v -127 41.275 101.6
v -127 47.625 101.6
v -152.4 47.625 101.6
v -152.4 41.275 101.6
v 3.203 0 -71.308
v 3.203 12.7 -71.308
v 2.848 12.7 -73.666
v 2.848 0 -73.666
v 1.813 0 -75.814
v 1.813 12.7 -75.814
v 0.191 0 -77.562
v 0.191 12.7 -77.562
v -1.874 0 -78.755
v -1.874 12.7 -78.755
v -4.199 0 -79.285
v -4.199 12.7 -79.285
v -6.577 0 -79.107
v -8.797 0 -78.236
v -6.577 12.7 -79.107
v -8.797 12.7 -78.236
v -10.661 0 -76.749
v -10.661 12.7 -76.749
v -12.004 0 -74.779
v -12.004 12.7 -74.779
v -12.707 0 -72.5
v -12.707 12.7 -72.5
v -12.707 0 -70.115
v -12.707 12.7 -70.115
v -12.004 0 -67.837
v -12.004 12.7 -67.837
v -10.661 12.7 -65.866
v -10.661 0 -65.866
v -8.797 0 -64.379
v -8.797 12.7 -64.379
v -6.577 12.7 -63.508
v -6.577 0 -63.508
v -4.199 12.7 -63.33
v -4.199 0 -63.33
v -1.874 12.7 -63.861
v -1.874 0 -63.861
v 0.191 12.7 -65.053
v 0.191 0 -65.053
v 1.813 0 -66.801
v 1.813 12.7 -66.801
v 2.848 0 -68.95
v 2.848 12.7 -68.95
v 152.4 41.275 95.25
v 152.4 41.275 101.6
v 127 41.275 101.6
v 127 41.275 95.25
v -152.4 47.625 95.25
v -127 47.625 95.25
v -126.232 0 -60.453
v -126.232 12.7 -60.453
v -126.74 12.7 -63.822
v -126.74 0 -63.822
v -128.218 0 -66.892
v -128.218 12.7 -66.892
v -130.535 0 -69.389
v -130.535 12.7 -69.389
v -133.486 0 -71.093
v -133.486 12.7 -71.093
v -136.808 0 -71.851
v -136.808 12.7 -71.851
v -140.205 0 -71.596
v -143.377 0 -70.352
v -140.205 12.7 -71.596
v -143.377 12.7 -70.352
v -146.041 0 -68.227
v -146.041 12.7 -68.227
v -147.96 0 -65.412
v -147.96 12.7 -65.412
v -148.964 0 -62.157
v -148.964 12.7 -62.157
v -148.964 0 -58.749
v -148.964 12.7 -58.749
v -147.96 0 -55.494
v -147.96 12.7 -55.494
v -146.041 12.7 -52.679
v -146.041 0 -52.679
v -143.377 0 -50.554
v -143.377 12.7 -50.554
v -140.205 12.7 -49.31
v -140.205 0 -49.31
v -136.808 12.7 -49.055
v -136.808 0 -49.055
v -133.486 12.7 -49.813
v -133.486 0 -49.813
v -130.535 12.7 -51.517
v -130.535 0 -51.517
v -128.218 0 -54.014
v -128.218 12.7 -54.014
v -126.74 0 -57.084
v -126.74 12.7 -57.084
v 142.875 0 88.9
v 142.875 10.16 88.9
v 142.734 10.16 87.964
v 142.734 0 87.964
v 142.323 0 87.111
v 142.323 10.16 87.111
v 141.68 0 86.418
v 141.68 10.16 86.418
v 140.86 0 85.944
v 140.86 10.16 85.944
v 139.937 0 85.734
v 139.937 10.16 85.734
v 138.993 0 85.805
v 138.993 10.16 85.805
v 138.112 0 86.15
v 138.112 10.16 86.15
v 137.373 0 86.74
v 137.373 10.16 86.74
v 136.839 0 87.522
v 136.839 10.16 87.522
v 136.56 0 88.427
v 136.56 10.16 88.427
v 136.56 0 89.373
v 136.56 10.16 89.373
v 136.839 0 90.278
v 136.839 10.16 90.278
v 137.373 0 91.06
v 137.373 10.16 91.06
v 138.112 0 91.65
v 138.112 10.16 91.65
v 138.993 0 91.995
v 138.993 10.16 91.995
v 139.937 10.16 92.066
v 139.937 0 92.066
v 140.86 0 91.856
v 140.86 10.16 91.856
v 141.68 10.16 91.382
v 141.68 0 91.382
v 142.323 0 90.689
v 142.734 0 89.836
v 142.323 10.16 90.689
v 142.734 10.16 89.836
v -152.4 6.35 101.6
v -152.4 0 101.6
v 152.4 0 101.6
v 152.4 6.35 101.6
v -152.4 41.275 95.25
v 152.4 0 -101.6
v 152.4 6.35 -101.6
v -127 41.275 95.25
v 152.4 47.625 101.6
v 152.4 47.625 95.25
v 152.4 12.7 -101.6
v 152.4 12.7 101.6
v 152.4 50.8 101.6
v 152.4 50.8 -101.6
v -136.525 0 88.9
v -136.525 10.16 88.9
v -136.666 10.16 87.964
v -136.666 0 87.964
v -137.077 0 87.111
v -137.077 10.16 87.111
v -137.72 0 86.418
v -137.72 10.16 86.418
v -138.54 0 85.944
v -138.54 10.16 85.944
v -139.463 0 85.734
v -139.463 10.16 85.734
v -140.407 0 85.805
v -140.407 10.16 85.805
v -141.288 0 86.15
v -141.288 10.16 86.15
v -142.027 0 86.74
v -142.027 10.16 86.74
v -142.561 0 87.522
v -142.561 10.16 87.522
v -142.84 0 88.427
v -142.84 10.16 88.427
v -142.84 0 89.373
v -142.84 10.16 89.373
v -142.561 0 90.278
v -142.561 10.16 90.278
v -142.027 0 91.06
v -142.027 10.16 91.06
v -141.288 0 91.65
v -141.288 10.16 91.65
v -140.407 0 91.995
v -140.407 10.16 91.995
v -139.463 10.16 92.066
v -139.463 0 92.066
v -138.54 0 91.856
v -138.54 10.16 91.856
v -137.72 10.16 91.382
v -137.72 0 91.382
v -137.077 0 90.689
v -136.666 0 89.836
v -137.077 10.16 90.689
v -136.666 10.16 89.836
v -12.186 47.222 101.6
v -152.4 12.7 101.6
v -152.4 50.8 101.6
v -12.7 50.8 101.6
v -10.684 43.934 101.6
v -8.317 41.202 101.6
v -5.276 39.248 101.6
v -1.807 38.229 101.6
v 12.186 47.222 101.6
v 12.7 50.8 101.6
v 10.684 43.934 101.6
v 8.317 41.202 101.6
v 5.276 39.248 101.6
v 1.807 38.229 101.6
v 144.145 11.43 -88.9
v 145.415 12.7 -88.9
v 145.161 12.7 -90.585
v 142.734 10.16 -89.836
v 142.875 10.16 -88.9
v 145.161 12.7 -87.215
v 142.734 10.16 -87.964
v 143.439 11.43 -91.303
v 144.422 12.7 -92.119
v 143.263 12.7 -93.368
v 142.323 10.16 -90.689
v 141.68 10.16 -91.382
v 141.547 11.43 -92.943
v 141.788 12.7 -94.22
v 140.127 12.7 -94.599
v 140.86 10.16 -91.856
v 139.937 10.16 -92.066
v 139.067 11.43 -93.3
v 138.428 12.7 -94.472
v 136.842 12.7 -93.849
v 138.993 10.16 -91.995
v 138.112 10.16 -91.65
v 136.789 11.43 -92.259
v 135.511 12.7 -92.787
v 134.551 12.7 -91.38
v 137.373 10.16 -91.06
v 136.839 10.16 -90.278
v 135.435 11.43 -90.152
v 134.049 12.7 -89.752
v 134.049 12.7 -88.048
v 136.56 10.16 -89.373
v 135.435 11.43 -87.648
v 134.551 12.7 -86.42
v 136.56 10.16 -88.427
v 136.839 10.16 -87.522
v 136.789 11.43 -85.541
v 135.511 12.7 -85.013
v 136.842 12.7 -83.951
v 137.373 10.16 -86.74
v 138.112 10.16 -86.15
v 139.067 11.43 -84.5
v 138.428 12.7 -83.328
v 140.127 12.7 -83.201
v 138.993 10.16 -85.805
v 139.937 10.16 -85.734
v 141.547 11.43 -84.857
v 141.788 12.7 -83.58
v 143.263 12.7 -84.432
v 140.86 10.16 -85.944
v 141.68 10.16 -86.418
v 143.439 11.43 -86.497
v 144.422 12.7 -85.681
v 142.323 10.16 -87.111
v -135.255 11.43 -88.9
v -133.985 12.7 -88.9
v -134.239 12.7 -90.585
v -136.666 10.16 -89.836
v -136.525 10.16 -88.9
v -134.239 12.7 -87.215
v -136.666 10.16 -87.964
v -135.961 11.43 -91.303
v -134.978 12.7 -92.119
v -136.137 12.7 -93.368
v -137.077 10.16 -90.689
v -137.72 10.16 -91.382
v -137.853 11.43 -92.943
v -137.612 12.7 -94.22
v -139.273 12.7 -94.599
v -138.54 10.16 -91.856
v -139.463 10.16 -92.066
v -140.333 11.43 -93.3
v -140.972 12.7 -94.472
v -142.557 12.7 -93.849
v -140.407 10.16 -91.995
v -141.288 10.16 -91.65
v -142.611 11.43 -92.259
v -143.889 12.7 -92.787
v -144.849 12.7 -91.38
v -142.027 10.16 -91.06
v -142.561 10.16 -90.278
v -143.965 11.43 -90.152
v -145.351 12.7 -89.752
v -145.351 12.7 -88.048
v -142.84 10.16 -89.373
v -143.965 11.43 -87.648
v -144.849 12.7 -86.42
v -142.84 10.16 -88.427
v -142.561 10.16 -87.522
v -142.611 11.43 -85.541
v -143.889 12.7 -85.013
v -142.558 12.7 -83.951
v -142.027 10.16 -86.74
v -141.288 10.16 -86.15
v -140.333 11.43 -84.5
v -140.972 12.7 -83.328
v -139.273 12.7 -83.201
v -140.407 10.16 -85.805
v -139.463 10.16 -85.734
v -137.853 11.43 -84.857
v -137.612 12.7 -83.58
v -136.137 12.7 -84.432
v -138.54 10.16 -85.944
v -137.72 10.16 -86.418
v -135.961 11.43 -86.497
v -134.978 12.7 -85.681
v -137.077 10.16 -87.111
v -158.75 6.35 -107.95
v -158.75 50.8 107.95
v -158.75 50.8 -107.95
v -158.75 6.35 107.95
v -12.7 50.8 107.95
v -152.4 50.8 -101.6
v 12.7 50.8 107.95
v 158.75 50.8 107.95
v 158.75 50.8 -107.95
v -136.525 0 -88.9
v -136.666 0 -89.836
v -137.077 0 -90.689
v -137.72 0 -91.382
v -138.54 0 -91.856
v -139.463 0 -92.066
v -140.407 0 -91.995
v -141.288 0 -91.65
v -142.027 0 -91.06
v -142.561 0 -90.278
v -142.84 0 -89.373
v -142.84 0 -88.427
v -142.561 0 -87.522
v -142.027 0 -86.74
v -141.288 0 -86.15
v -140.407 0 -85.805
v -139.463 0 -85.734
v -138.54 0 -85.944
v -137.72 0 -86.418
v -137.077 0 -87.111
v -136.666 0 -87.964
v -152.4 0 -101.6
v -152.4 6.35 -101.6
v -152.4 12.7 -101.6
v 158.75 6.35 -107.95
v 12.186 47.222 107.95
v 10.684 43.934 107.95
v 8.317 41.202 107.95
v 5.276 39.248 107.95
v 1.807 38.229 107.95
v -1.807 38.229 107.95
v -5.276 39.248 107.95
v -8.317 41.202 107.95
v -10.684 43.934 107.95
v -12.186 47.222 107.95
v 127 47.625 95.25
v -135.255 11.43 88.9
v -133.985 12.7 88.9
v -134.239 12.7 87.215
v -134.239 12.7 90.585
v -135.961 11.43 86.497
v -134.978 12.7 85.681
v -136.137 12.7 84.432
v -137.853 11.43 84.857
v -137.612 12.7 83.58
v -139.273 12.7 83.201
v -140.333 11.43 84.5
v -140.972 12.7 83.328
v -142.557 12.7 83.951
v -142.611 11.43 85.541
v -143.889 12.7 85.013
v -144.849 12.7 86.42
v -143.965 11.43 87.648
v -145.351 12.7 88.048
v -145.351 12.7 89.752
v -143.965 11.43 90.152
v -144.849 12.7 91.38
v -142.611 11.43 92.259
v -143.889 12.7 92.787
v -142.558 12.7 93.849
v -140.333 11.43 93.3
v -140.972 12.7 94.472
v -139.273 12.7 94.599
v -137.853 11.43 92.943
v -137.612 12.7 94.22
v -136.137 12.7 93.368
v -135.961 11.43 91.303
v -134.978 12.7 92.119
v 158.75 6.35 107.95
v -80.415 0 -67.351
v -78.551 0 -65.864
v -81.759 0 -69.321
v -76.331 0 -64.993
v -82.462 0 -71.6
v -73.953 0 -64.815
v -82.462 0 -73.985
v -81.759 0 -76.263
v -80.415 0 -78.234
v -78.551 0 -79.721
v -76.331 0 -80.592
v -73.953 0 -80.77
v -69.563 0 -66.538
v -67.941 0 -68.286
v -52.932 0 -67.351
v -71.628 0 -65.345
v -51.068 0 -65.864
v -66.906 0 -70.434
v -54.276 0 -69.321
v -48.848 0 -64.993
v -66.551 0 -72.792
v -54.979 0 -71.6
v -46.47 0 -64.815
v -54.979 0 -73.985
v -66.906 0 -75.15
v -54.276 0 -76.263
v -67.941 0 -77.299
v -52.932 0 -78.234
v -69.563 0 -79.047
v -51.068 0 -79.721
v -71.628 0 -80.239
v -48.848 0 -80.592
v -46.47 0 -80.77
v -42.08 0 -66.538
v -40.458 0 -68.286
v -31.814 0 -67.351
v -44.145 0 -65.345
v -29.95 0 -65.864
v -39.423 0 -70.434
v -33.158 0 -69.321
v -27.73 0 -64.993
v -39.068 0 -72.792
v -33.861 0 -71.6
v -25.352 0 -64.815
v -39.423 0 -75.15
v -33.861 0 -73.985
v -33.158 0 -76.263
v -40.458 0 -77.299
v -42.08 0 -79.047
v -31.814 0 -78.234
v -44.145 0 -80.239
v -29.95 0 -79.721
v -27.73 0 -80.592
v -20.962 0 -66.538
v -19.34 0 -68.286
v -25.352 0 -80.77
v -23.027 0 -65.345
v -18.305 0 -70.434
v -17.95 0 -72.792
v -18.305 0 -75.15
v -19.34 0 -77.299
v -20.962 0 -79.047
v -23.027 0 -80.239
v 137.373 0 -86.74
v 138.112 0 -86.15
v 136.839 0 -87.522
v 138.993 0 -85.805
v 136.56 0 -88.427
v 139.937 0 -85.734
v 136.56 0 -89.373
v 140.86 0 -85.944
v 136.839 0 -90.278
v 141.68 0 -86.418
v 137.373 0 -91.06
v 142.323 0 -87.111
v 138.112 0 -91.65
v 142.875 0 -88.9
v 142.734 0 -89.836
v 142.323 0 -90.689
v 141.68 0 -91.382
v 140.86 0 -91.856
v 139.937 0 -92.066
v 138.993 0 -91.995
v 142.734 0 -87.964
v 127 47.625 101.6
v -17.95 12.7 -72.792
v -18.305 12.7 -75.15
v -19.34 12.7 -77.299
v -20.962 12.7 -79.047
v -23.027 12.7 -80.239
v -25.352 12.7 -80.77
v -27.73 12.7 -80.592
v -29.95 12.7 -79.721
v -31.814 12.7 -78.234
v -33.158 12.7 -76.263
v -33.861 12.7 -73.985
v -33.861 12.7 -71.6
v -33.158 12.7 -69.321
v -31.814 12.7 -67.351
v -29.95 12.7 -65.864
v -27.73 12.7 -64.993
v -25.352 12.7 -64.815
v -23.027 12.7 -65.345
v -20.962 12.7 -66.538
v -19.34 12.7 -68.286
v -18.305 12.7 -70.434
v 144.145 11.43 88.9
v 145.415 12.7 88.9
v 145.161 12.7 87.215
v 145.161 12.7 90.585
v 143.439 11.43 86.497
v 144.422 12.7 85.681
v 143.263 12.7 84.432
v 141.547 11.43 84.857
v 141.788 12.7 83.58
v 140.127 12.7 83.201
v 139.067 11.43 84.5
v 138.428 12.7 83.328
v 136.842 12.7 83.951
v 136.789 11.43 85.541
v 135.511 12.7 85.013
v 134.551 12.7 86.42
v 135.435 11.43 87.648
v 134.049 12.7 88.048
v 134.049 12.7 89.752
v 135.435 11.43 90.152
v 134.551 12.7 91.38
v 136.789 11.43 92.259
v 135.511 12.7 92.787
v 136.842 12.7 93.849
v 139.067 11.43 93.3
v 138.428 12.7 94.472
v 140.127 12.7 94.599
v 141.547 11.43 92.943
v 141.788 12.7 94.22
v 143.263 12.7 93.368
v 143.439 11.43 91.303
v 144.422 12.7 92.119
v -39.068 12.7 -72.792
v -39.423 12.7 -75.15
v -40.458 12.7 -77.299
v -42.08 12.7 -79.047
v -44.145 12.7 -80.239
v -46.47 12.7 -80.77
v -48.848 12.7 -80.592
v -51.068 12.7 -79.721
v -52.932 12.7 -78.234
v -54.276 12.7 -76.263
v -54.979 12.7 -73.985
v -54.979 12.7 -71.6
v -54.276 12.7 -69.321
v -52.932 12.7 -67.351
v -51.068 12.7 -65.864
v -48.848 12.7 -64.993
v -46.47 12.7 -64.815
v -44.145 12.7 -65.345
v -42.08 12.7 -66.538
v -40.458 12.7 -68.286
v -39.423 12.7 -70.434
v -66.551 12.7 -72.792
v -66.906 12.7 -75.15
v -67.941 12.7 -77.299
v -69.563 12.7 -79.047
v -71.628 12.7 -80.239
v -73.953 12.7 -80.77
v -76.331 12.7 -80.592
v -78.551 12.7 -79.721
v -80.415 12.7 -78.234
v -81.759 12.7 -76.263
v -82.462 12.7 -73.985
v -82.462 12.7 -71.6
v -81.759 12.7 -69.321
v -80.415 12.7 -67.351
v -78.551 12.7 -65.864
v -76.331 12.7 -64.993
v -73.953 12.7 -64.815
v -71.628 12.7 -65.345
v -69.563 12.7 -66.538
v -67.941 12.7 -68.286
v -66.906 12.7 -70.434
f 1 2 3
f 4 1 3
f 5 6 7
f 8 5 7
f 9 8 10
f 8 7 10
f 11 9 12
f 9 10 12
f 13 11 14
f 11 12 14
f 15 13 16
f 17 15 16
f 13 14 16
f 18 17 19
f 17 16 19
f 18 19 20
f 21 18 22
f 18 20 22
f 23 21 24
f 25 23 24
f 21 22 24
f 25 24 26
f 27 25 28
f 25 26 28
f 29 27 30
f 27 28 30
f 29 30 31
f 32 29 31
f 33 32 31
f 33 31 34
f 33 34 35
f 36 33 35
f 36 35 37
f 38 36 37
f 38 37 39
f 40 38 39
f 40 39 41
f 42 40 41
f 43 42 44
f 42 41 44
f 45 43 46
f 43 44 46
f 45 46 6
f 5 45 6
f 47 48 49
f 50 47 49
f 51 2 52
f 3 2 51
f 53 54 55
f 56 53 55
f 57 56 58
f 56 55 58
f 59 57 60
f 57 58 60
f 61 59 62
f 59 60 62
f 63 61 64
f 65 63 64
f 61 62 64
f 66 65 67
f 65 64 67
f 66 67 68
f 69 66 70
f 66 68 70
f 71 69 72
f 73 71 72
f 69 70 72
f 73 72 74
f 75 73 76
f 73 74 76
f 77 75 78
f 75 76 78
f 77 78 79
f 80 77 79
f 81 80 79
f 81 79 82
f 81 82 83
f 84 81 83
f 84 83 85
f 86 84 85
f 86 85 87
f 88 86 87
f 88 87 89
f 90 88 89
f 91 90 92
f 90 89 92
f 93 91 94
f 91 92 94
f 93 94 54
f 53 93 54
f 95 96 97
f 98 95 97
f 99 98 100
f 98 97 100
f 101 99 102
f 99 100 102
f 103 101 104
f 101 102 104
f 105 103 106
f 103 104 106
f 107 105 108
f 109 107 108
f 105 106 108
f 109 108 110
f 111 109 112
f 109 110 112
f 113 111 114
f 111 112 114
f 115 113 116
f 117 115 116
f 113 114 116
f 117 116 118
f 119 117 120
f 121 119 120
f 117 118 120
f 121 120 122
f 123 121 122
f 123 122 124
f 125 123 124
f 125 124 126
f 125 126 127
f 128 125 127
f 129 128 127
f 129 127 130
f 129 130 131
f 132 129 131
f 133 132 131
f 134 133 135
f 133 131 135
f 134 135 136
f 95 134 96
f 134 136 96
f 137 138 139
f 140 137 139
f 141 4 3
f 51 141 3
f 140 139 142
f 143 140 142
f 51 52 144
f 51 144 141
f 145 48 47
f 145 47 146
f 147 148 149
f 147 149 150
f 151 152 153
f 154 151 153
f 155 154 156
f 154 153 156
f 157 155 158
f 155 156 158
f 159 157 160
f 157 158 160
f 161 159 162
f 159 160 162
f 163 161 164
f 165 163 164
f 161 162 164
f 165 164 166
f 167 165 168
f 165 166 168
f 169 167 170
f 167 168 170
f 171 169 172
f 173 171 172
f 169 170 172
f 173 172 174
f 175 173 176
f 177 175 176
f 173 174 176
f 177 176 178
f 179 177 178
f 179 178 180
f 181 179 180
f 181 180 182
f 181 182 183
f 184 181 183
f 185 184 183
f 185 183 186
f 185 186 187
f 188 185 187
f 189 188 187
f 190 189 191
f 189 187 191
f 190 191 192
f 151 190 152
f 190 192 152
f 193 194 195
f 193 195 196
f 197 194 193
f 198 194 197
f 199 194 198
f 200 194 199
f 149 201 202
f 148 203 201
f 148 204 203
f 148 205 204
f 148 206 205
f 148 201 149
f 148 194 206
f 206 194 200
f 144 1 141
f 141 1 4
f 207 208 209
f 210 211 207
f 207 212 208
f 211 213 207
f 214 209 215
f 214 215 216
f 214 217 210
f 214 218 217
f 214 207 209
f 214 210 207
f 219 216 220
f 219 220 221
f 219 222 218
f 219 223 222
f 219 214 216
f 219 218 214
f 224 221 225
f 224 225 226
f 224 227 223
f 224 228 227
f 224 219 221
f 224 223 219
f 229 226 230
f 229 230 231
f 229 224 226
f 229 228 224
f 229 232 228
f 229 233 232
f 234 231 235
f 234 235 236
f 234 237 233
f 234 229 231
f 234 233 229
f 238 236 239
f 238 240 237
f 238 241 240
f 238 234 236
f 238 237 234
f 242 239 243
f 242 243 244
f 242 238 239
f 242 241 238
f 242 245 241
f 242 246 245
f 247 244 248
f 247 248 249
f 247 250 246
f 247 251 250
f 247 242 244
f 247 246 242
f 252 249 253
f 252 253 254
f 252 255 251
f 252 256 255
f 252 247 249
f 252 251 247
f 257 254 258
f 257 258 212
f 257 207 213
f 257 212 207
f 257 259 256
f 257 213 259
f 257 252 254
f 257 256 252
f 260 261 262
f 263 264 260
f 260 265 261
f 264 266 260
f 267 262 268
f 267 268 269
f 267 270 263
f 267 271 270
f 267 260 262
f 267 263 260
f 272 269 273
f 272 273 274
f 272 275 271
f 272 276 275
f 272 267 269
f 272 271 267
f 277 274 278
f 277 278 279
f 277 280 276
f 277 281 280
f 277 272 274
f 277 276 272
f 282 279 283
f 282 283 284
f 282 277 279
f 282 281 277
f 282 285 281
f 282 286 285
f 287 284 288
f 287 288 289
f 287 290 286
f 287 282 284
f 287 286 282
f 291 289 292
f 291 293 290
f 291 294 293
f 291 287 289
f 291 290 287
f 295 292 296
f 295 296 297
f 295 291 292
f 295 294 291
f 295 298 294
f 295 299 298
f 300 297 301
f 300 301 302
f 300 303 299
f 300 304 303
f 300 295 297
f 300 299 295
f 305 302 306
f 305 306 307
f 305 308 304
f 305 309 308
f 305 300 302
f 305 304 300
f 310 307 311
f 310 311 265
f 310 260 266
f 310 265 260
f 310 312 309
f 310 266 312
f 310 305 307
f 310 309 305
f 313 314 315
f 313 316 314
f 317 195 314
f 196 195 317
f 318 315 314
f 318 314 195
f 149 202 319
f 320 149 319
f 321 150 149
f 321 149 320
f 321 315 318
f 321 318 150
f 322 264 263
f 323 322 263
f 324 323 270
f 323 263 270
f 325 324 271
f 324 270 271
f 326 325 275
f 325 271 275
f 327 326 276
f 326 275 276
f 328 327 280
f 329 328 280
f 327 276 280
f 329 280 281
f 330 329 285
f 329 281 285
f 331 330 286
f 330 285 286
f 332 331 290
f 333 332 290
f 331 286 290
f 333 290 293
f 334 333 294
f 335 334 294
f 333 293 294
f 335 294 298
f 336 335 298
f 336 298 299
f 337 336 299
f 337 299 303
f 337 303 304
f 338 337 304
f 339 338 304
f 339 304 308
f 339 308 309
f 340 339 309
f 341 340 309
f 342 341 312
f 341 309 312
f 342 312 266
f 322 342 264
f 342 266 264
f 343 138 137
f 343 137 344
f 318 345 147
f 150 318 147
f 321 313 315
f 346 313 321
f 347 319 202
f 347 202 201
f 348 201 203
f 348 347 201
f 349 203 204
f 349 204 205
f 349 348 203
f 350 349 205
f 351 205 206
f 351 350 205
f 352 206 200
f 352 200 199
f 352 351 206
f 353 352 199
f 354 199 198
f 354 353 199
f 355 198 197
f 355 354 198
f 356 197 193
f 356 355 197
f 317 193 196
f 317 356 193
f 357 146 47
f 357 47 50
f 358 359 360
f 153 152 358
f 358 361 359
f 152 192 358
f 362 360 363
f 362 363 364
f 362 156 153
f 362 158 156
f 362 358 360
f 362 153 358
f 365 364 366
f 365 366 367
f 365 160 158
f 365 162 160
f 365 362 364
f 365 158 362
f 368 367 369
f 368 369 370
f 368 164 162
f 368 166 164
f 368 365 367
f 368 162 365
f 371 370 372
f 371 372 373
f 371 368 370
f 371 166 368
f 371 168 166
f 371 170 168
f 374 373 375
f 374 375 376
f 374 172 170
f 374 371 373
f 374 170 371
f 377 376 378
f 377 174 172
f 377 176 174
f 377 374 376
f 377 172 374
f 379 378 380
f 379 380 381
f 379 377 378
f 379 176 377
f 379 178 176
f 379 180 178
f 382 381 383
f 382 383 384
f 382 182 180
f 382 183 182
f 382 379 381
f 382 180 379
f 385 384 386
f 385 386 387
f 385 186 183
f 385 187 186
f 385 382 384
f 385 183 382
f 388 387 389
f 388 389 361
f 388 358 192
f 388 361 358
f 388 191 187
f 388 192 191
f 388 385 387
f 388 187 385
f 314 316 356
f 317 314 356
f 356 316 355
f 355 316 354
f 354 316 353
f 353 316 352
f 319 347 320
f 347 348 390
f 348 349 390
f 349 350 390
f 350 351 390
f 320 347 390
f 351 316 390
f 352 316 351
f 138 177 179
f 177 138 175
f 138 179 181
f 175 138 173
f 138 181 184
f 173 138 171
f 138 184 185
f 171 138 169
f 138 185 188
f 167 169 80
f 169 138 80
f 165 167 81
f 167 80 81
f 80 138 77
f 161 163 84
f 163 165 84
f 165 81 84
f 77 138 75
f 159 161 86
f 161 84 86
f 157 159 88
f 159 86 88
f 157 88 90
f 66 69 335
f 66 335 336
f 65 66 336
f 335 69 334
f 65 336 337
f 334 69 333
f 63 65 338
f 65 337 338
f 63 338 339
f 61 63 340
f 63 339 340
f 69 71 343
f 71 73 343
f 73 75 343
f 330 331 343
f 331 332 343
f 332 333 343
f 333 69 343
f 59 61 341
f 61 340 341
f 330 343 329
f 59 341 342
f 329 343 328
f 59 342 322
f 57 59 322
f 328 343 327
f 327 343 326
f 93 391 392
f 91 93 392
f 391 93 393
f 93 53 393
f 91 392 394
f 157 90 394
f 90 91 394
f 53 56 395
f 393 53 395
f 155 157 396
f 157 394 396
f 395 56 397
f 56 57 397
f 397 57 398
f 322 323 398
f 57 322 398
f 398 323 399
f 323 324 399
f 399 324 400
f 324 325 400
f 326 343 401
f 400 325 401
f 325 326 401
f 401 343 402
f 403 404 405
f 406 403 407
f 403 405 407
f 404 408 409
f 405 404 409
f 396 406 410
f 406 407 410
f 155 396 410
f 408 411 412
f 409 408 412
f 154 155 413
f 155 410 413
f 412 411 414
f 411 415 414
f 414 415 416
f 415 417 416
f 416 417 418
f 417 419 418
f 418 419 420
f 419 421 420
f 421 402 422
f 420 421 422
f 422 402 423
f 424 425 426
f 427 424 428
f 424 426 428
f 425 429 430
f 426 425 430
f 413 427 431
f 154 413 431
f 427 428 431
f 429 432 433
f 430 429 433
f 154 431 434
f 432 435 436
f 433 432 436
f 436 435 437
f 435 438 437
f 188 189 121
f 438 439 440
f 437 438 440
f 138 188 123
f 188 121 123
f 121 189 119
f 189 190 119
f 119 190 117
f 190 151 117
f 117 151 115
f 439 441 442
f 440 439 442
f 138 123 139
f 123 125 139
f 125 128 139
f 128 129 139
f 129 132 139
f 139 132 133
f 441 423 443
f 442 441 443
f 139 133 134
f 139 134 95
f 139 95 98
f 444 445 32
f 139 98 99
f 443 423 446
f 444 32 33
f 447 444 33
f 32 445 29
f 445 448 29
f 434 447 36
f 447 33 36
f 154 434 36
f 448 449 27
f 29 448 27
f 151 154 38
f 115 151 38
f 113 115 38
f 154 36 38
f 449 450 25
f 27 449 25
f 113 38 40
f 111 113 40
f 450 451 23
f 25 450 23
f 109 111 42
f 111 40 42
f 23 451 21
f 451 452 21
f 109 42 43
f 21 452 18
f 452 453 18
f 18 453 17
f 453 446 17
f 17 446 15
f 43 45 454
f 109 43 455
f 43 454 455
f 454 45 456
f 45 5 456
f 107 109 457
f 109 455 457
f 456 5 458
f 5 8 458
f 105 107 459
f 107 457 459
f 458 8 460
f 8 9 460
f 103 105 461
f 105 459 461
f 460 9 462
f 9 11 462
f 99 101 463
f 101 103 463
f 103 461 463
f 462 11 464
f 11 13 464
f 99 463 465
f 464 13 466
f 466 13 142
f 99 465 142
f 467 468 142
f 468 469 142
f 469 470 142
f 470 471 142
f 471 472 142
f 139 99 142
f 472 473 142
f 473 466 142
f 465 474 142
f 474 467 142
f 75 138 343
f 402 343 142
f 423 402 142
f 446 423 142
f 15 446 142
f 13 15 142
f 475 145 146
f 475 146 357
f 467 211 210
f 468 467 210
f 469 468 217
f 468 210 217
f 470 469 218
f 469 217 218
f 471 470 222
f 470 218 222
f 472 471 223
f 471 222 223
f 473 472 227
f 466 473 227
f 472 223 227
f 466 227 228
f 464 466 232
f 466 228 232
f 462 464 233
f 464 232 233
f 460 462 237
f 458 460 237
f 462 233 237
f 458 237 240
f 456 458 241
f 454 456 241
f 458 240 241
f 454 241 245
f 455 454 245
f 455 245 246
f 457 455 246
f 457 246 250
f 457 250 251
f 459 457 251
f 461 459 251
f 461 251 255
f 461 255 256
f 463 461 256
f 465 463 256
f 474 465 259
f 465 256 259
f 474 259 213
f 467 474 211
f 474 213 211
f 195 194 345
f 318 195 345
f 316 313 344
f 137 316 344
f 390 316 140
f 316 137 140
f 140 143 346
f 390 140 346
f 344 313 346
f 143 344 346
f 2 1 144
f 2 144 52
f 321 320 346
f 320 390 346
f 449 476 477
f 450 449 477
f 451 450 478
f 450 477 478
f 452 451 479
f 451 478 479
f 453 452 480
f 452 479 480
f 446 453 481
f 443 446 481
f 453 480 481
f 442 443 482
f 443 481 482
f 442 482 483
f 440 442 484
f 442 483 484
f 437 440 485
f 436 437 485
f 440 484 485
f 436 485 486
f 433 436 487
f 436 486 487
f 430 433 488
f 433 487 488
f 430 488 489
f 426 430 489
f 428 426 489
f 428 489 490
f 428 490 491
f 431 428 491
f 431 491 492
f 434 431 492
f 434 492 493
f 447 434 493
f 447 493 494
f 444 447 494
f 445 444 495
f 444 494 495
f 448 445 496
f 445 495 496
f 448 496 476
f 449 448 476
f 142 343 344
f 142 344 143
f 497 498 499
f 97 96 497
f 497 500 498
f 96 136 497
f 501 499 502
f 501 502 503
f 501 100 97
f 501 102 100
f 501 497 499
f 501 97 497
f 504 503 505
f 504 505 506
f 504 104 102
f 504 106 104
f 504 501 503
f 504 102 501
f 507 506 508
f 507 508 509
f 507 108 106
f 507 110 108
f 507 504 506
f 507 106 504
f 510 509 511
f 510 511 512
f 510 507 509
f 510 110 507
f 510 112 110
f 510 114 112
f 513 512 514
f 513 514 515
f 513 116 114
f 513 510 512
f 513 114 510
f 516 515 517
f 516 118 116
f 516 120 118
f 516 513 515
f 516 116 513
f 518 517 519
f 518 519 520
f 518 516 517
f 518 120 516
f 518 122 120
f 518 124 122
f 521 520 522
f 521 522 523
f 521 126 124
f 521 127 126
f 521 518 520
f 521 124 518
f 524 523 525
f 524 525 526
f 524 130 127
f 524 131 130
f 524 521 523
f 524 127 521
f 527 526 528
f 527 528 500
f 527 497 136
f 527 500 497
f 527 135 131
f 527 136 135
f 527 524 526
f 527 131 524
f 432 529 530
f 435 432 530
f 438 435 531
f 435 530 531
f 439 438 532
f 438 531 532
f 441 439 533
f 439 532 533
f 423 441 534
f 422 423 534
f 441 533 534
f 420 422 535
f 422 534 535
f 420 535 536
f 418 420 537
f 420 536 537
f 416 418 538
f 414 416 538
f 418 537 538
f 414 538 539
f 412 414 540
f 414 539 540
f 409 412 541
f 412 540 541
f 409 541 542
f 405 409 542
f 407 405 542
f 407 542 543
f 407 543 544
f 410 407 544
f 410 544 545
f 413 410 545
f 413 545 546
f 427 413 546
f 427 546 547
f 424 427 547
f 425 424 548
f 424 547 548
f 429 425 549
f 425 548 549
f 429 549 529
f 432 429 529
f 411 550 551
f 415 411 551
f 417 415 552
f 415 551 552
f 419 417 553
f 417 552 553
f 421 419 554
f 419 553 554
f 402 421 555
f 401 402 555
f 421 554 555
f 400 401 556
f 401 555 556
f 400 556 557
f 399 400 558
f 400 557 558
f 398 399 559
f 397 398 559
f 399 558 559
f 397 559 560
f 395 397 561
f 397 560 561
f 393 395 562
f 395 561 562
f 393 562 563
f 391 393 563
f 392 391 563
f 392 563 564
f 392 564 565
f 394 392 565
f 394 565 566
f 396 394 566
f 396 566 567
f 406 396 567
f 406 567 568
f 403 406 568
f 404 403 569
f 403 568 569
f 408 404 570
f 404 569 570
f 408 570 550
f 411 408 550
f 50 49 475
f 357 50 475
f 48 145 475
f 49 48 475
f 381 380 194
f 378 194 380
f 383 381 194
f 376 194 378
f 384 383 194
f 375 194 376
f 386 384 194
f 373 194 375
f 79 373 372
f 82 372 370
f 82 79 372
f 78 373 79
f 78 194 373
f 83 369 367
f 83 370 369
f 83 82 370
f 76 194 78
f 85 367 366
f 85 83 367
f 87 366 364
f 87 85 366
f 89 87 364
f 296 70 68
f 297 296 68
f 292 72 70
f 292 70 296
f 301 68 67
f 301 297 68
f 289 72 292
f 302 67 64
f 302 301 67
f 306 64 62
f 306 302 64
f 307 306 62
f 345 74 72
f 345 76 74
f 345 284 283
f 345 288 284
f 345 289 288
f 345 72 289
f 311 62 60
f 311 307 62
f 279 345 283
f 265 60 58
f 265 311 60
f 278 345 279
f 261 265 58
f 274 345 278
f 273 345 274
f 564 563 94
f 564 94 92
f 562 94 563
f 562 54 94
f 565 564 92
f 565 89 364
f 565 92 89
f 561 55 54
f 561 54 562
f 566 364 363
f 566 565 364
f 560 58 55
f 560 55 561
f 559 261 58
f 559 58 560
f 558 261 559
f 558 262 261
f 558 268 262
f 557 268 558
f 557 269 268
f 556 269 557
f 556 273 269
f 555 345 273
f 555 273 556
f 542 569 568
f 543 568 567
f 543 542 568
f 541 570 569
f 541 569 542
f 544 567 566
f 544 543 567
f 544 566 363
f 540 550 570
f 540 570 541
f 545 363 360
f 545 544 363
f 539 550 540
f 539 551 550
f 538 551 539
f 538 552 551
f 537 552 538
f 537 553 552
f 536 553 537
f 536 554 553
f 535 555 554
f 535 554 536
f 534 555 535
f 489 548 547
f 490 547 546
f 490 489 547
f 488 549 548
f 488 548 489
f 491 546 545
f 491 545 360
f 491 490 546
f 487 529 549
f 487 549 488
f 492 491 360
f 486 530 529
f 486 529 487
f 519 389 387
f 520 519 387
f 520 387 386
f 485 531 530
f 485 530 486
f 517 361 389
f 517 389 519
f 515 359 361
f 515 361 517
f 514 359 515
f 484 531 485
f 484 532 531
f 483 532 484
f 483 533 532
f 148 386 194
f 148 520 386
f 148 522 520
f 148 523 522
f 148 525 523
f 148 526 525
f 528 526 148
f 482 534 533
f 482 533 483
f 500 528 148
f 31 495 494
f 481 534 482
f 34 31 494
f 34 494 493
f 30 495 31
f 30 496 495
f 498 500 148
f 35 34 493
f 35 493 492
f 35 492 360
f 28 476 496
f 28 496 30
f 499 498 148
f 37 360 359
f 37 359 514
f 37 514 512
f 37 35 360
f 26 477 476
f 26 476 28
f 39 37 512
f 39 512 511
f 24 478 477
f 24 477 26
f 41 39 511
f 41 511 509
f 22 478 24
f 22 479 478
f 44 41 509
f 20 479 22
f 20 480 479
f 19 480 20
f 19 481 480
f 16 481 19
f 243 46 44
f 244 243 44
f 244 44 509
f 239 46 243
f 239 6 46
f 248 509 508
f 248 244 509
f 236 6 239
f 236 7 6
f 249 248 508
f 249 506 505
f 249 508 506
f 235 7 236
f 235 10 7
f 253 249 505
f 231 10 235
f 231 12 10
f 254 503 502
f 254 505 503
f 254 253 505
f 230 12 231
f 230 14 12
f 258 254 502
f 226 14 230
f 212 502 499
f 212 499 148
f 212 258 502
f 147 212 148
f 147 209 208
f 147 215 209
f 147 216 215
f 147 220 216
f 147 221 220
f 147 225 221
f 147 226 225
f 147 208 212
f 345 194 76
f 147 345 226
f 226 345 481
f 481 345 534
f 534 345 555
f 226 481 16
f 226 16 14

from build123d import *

# Parameters (mm, degrees)
SKETCH1_W             = 304.8
SKETCH1_H             = 203.2
BOSS_EXTRUDE1_DEPTH   = 6.35
SKETCH2_W             = 317.5
SKETCH2_H             = 215.9
BOSS_EXTRUDE2_DEPTH   = 6.35
SKETCH3_R             = 3.175
CUT_EXTRUDE1_DEPTH    = 12.7
CHAMFER1_SIZE         = 2.54
SKETCH6_W             = 317.5
SKETCH6_H             = 215.9
SKETCH6_W_2           = 304.8
SKETCH6_H_2           = 203.2
BOSS_EXTRUDE3_DEPTH   = 38.1
SKETCH7_W             = 25.4
SKETCH7_H             = 6.35
BOSS_EXTRUDE4_DEPTH   = 6.35
BOSS_EXTRUDE4_2_DEPTH = 6.35
CUT_EXTRUDE4_DEPTH    = 6.35
SKETCH4_R             = 11.43
SKETCH4_R_2           = 8
CUT_EXTRUDE2_DEPTH    = 12.7


with BuildPart() as part:
    # Sketch1 → Boss-Extrude1 (new body)
    with BuildSketch(Plane(origin=(0, 0, 0), x_dir=(1, 0, 0), z_dir=(0, 1, 0))):
        Rectangle(SKETCH1_W, SKETCH1_H)
    extrude(amount=BOSS_EXTRUDE1_DEPTH)

    # Sketch2 → Boss-Extrude2 (add)
    with BuildSketch(Plane(origin=(0, 6.35, 0), x_dir=(1, 0, 0), z_dir=(0, 1, 0))):
        Rectangle(SKETCH2_W, SKETCH2_H)
    extrude(amount=BOSS_EXTRUDE2_DEPTH)

    # Sketch3 → Cut-Extrude1 (cut)
    with BuildSketch(Plane(origin=(0, 12.7, 0), x_dir=(1, 0, 0), z_dir=(0, 1, 0))):
        with Locations((-139.7, 88.9)):
            Circle(SKETCH3_R)
        with Locations((139.7, 88.9)):
            Circle(SKETCH3_R)
        with Locations((139.7, -88.9)):
            Circle(SKETCH3_R)
        with Locations((-139.7, -88.9)):
            Circle(SKETCH3_R)
    extrude(amount=-CUT_EXTRUDE1_DEPTH, mode=Mode.SUBTRACT)

    # Chamfer1
    chamfer1_edges = [part.edges().sort_by_distance(p)[0] for p in [
        (-142.875, 12.7, -88.9),
        (-142.875, 12.7, 88.9),
        (136.525, 12.7, 88.9),
        (136.525, 12.7, -88.9),
    ]]
    chamfer(chamfer1_edges, length=CHAMFER1_SIZE)

    # Sketch6 → Boss-Extrude3 (add)
    with BuildSketch(Plane(origin=(0, 12.7, 0), x_dir=(1, 0, 0), z_dir=(0, 1, 0))):
        Rectangle(SKETCH6_W, SKETCH6_H)
        Rectangle(SKETCH6_W_2, SKETCH6_H_2, mode=Mode.SUBTRACT)
    extrude(amount=BOSS_EXTRUDE3_DEPTH)

    # Sketch8 → Cut-Extrude4 (cut)
    with BuildSketch(Plane.XY.offset(107.95)):
        with BuildLine():
            Line((-12.7, 50.8), (12.7, 50.8))
            ThreePointArc((12.7, 50.8), (0, 38.1), (-12.7, 50.8))
        make_face()
    extrude(amount=-CUT_EXTRUDE4_DEPTH, mode=Mode.SUBTRACT)

    # Sketch4 → Cut-Extrude2 (cut)
    with BuildSketch(Plane(origin=(0, 12.7, 0), x_dir=(1, 0, 0), z_dir=(0, 1, 0))):
        with Locations((-137.6617313, 60.452979471)):
            Circle(SKETCH4_R)
        with Locations((-74.550951205, 72.792379988)):
            Circle(SKETCH4_R_2)
        with Locations((-47.067953057, 72.792379988)):
            Circle(SKETCH4_R_2)
        with Locations((-25.949935803, 72.792379988)):
            Circle(SKETCH4_R_2)
        with Locations((-4.796640674, 71.307645451)):
            Circle(SKETCH4_R_2)
    extrude(amount=-CUT_EXTRUDE2_DEPTH, mode=Mode.SUBTRACT)


with BuildPart() as body_2:
    # Sketch7 → Boss-Extrude4 (new body)
    with BuildSketch(Plane(origin=(0, 0, 101.6), x_dir=(-1, 0, 0), z_dir=(0, 0, -1))):
        with Locations((-139.7, 44.45)):
            Rectangle(SKETCH7_W, SKETCH7_H)
    extrude(amount=BOSS_EXTRUDE4_DEPTH)


with BuildPart() as body_3:
    # Sketch7 → Boss-Extrude4 2 (new body)
    with BuildSketch(Plane(origin=(0, 0, 101.6), x_dir=(-1, 0, 0), z_dir=(0, 0, -1))):
        with Locations((139.7, 44.45)):
            Rectangle(SKETCH7_W, SKETCH7_H)
    extrude(amount=BOSS_EXTRUDE4_2_DEPTH)


solid = Compound([part.part, body_2.part, body_3.part])
